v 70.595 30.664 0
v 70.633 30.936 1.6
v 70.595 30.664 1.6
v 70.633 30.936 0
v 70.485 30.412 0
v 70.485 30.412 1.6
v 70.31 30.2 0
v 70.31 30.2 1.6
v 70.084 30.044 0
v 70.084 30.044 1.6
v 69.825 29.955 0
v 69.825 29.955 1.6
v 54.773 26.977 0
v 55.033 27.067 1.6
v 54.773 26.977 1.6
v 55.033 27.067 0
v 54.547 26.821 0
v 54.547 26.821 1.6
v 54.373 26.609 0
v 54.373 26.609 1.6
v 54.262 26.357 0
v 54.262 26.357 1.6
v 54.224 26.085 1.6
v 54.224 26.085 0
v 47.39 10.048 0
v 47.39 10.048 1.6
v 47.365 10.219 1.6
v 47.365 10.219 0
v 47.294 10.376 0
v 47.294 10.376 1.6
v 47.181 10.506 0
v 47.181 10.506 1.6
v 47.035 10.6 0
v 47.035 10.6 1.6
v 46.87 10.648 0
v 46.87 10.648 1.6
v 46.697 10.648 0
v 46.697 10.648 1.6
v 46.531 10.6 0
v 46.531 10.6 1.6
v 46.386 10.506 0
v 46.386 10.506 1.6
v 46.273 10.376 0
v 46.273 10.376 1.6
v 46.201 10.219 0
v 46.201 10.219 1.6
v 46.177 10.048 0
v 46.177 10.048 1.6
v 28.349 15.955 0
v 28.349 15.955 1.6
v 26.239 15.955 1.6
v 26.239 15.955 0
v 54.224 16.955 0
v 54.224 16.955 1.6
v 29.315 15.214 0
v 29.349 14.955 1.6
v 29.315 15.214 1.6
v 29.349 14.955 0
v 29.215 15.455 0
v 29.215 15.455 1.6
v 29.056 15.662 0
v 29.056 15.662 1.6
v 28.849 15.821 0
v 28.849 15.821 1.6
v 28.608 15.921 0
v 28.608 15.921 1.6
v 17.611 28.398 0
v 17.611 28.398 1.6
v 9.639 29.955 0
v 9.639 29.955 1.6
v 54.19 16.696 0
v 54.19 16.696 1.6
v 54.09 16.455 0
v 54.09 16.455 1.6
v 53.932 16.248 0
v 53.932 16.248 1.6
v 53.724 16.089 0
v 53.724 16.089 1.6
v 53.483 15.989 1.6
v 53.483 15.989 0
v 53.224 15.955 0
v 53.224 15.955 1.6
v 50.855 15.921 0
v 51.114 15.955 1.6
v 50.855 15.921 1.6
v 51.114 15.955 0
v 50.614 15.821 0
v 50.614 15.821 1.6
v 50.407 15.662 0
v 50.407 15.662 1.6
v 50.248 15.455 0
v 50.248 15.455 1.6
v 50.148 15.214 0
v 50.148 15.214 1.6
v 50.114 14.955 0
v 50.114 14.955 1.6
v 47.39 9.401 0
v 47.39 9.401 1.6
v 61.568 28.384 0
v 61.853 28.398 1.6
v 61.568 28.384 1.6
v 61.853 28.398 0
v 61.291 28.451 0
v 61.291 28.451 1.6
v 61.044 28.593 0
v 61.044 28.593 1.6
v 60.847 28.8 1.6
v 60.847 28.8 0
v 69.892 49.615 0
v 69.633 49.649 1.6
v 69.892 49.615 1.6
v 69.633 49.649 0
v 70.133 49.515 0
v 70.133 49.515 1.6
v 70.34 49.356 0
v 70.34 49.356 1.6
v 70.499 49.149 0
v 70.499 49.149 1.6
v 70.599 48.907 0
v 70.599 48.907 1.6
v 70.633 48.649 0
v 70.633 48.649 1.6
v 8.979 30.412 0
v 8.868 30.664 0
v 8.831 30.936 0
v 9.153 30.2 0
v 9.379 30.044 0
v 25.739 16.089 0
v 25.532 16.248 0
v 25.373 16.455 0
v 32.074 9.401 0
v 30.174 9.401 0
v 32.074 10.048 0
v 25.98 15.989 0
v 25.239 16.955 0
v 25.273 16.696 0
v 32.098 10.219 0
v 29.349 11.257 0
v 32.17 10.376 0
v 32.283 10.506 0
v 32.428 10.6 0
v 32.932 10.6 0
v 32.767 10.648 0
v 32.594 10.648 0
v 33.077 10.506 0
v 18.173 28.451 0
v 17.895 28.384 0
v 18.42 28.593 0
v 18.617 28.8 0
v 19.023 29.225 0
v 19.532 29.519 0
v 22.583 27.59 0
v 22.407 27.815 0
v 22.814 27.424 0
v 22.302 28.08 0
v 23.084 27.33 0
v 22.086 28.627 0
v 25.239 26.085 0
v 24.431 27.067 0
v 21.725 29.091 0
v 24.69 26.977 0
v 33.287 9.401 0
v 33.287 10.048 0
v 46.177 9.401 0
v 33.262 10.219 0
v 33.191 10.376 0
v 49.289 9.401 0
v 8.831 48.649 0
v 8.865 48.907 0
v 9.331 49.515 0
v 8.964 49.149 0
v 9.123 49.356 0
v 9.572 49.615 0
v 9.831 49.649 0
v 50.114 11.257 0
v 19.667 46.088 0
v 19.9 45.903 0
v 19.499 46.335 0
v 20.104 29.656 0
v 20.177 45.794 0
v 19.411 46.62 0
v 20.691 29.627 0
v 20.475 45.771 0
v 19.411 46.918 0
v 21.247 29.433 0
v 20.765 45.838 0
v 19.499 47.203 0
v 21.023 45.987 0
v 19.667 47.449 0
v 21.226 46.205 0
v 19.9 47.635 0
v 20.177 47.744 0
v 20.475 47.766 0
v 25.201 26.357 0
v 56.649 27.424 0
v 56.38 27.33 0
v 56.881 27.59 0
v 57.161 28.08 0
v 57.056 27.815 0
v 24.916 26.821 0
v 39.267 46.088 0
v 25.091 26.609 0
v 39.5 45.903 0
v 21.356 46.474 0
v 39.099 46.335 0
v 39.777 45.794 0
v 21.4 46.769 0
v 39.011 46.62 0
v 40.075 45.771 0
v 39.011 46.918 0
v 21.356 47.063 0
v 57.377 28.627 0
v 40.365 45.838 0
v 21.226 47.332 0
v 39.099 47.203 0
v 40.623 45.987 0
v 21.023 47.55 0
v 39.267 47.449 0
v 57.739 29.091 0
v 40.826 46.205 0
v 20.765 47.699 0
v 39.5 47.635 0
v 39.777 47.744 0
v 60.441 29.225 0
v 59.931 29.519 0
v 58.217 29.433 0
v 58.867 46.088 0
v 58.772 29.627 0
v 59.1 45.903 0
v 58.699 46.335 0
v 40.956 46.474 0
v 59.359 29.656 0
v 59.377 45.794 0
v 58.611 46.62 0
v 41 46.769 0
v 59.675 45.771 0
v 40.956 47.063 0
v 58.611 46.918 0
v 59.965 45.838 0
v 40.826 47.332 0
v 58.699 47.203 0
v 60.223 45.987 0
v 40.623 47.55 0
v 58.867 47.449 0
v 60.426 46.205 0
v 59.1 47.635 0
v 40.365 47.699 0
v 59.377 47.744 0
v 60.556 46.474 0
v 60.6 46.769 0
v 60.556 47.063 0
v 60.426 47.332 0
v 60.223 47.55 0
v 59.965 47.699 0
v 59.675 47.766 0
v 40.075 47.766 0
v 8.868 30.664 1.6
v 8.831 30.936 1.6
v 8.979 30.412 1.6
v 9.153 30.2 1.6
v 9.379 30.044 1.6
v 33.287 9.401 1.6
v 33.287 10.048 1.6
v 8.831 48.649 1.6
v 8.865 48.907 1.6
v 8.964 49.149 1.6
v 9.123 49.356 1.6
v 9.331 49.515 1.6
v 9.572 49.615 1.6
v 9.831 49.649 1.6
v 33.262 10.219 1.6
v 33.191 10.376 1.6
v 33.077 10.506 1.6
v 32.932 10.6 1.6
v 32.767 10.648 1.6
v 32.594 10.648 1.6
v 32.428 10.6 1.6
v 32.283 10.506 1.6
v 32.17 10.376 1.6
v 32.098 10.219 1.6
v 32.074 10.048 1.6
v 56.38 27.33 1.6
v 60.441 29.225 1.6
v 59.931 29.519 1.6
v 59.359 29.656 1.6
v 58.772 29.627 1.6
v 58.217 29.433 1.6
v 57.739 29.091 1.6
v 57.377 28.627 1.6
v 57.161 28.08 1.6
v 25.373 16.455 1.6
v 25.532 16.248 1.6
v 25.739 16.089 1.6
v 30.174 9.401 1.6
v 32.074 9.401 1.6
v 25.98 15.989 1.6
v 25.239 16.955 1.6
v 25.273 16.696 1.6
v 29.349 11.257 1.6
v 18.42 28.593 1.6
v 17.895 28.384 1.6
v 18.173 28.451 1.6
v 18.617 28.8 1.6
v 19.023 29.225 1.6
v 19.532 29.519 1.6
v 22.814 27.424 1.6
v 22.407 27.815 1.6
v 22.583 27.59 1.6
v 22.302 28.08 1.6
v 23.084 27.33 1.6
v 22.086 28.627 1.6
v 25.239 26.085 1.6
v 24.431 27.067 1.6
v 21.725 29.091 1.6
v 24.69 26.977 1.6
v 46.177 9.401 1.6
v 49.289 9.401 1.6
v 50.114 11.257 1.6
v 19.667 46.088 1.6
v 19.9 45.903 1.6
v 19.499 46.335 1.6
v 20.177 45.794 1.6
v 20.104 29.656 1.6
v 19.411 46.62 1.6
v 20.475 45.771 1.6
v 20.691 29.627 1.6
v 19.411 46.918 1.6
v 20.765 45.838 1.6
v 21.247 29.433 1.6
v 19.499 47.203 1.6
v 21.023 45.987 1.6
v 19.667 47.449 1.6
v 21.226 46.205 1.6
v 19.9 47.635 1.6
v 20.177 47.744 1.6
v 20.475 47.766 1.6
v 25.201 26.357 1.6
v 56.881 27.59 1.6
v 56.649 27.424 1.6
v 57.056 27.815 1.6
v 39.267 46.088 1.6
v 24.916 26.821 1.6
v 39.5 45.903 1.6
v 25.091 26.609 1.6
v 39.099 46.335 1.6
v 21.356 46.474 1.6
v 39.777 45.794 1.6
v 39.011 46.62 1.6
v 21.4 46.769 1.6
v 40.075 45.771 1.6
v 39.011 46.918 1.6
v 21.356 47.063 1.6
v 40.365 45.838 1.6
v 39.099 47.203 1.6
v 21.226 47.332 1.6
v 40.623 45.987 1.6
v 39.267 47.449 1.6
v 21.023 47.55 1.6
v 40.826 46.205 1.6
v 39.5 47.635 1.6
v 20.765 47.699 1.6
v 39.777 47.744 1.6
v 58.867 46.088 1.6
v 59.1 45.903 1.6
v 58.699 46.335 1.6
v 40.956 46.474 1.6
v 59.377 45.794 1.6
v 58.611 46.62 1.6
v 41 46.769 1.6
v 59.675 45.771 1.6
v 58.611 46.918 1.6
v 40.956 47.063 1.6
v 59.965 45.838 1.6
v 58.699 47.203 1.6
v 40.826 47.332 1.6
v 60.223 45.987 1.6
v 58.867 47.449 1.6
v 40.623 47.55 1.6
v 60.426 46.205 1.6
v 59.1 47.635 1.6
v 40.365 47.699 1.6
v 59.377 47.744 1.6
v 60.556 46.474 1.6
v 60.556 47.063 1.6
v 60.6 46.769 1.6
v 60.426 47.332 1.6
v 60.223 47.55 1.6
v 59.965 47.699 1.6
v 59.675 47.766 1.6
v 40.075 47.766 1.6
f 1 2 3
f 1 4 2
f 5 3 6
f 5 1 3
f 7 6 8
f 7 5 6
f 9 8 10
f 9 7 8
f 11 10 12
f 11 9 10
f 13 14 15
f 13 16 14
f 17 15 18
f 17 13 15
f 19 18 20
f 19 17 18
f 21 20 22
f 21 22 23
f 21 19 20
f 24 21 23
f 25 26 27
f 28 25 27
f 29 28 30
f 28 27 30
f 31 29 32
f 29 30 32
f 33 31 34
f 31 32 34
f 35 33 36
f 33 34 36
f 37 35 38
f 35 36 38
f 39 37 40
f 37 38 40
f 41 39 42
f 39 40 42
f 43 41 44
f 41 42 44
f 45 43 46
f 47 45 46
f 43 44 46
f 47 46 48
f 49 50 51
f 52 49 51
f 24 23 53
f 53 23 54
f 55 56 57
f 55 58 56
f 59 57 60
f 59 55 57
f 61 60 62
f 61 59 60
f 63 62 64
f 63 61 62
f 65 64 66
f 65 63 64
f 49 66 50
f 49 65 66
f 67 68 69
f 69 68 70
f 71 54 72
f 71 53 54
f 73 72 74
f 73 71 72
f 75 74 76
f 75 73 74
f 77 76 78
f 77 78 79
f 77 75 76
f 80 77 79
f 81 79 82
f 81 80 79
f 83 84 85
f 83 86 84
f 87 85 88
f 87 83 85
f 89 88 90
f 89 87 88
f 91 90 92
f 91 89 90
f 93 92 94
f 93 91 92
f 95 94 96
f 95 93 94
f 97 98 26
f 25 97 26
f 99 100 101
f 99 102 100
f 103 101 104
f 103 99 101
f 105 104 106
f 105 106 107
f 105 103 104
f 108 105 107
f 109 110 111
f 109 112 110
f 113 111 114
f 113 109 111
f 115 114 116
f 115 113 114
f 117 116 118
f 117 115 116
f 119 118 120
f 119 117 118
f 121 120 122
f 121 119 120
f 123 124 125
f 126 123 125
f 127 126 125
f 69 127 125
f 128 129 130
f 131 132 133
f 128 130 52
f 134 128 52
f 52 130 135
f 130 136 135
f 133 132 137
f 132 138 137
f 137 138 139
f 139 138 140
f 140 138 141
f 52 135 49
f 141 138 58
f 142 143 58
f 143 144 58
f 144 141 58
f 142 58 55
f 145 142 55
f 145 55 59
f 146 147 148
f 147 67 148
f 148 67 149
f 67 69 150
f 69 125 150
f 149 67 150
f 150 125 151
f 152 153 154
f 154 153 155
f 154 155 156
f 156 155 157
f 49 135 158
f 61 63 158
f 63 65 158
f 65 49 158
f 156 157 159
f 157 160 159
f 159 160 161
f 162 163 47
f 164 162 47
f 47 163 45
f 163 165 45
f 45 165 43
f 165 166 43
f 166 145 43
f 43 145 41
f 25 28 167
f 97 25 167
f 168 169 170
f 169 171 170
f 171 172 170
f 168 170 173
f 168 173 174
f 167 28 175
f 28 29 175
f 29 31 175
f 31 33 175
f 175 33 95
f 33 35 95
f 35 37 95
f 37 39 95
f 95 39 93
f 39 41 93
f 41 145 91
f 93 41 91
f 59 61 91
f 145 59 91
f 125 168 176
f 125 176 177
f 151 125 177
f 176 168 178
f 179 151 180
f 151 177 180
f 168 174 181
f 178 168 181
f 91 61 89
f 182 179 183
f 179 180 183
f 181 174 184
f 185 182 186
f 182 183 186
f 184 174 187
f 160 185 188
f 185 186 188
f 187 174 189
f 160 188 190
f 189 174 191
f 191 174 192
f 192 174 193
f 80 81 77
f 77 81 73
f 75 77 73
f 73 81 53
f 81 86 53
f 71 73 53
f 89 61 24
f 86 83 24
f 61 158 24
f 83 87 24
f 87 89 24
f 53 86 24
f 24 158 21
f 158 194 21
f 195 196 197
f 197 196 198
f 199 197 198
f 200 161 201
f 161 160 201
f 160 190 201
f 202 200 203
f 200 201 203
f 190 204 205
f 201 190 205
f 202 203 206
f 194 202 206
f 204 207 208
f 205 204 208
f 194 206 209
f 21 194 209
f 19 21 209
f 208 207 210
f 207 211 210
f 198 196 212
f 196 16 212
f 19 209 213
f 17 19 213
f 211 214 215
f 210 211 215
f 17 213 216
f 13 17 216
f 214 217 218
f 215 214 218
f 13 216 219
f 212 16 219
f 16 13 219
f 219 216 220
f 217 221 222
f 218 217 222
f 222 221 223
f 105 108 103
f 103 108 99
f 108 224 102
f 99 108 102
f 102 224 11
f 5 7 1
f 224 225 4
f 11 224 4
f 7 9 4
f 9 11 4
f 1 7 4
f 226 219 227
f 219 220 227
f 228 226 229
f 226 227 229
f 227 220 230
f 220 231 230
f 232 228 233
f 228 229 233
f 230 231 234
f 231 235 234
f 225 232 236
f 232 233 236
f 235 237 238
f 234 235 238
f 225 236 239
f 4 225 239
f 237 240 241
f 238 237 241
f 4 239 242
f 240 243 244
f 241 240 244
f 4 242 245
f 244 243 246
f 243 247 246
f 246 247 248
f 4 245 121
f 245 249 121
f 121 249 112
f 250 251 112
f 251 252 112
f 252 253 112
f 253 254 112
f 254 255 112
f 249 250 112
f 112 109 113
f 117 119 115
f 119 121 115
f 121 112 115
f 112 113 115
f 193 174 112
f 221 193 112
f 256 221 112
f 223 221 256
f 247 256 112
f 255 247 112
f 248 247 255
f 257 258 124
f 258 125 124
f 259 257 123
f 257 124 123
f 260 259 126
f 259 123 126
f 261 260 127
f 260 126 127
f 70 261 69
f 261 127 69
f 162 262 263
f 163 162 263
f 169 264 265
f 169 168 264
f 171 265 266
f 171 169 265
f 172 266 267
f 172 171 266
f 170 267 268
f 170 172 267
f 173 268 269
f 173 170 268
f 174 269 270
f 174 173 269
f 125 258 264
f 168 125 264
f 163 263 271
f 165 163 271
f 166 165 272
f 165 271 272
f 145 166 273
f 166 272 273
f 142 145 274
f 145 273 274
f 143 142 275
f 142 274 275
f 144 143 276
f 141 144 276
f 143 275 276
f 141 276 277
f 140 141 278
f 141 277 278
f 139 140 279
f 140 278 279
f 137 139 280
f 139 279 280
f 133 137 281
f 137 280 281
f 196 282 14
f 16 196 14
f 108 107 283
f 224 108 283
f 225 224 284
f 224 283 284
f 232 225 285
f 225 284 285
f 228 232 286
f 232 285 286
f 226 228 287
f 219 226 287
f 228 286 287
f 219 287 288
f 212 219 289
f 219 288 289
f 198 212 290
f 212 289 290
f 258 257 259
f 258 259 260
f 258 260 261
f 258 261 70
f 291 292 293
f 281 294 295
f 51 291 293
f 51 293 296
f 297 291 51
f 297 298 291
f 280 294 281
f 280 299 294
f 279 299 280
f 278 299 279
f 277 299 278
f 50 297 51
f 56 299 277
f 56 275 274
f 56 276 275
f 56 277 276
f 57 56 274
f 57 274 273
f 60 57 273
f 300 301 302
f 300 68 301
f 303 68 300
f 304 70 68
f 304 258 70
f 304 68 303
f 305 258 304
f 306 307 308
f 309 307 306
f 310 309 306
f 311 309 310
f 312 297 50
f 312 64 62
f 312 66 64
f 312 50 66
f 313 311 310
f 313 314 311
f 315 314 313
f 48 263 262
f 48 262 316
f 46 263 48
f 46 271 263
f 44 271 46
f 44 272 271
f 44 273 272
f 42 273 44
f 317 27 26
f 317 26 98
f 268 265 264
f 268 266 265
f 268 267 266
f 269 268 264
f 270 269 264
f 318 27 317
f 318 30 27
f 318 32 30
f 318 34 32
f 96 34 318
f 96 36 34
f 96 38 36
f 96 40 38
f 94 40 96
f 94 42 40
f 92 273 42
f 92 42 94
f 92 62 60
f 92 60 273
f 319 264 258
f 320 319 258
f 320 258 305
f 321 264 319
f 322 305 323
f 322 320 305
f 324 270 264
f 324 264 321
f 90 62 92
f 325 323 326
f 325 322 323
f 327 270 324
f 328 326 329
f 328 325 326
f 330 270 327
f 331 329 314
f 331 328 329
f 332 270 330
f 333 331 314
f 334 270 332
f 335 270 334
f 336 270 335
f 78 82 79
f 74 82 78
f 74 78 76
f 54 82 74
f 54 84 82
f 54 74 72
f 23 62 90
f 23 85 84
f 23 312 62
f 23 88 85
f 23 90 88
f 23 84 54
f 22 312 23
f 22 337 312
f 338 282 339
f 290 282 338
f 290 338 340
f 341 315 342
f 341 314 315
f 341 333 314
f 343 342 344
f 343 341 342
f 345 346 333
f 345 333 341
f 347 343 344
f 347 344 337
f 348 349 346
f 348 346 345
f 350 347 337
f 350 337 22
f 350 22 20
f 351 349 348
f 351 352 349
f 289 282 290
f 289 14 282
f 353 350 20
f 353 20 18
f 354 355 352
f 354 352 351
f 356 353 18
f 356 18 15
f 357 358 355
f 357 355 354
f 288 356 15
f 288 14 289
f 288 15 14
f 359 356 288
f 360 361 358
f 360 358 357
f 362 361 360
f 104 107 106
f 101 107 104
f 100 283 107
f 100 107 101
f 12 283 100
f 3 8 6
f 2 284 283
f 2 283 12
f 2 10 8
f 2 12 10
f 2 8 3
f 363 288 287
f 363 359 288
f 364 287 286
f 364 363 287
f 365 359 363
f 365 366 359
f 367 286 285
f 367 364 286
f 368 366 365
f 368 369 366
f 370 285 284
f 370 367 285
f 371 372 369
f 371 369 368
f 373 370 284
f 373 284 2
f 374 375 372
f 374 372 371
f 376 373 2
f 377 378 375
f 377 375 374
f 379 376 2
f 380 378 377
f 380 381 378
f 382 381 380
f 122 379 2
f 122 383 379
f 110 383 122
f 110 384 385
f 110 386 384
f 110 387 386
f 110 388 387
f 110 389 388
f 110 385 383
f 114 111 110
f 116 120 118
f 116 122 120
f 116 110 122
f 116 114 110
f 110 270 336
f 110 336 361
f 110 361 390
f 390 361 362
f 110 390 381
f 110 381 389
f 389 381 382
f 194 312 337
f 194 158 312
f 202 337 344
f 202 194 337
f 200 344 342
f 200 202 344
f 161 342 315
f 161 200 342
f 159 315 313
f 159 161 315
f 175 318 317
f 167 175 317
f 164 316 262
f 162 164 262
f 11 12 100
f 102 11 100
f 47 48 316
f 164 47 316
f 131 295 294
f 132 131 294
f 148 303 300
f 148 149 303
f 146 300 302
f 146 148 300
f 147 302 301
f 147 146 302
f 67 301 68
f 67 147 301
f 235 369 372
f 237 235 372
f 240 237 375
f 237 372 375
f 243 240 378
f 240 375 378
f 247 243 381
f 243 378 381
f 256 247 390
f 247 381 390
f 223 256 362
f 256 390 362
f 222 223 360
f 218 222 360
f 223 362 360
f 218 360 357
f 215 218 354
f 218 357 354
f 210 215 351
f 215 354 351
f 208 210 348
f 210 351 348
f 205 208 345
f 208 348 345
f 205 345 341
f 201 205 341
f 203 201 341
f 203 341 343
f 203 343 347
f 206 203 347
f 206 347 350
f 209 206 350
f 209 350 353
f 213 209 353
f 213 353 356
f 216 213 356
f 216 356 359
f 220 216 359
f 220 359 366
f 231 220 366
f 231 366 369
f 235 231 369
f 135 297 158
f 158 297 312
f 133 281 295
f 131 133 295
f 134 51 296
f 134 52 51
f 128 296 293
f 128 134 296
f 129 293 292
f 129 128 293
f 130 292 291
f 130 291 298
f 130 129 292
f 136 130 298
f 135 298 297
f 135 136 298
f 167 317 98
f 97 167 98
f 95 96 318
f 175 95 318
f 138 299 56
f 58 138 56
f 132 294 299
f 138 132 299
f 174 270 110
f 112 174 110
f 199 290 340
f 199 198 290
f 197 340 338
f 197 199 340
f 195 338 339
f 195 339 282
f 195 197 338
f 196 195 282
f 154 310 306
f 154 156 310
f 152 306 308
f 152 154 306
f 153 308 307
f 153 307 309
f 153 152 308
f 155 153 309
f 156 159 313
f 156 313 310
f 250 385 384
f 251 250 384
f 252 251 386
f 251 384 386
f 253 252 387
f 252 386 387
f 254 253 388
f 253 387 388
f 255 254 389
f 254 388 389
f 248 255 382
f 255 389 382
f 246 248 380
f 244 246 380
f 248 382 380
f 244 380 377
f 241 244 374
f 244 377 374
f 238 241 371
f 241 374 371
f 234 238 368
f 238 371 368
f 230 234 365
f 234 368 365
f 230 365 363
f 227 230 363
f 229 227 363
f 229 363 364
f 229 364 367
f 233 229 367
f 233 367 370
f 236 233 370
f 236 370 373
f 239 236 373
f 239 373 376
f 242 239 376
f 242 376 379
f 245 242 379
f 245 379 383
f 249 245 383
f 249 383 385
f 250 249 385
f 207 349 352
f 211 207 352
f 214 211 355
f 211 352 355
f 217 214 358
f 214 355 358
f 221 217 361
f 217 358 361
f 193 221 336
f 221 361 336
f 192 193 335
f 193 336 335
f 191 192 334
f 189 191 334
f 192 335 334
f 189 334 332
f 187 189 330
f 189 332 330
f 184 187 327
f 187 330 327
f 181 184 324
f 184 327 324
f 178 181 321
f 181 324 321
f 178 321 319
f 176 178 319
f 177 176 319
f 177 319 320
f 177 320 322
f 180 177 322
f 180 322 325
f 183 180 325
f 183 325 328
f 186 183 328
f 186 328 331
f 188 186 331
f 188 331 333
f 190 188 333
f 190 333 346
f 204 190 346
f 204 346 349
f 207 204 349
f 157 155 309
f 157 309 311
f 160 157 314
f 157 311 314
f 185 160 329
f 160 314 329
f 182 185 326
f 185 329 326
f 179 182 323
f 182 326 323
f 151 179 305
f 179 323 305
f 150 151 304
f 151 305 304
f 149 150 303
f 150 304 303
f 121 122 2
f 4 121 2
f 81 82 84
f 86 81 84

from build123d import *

# Parameters (mm, degrees)
SKETCH1_W           = 80
SKETCH1_H           = 60
BOSS_EXTRUDE1_DEPTH = 1.6
SKETCH2_OUTSIDE_W   = 102.002
SKETCH2_OUTSIDE_H   = 82.002
CUT_EXTRUDE1_DEPTH  = 1.6
FILLET1_R           = 1
SKETCH3_R           = 1
CUT_EXTRUDE2_DEPTH  = 10


with BuildPart() as part:
    # Sketch1 → Boss-Extrude1 (new body)
    with BuildSketch(Plane.XY):
        with Locations((40, 30)):
            Rectangle(SKETCH1_W, SKETCH1_H)
    extrude(amount=BOSS_EXTRUDE1_DEPTH)

    # Sketch2 outside → Cut-Extrude1 (cut)
    with BuildSketch(Plane.XY.offset(1.6)):
        with Locations((40, 30)):
            Rectangle(SKETCH2_OUTSIDE_W, SKETCH2_OUTSIDE_H)
        with BuildLine():
            Line((8.830524125, 49.648617791), (70.632878184, 49.648617791))
            Line((70.632878184, 49.648617791), (70.632878184, 30.112540158))
            Line((70.632878184, 30.112540158), (61.123106489, 28.255784683))
            ThreePointArc((61.123106489, 28.255784683), (58.77201565, 29.627241667), (57.109476194, 27.472134952))
            Line((57.109476194, 27.472134952), (54.224418996, 26.908835862))
            Line((54.224418996, 26.908835862), (54.224418996, 15.955223451))
            Line((54.224418996, 15.955223451), (50.114060899, 15.955223451))
            Line((50.114060899, 15.955223451), (50.114060899, 11.256501231))
            Line((50.114060899, 11.256501231), (49.289397665, 9.401008955))
            Line((49.289397665, 9.401008955), (47.389901446, 9.401008955))
            Line((47.389901446, 9.401008955), (47.389901446, 10.047799846))
            ThreePointArc((47.389901446, 10.047799846), (46.783221619, 10.654479673), (46.176541793, 10.047799846))
            Line((46.176541793, 10.047799846), (46.176541793, 9.401008955))
            Line((46.176541793, 9.401008955), (33.286860516, 9.401008955))
            Line((33.286860516, 9.401008955), (33.286860516, 10.047799846))
            ThreePointArc((33.286860516, 10.047799846), (32.68018069, 10.654479673), (32.073500863, 10.047799846))
            Line((32.073500863, 10.047799846), (32.073500863, 9.401008955))
            Line((32.073500863, 9.401008955), (30.174004644, 9.401008955))
            Line((30.174004644, 9.401008955), (29.34934141, 11.256501231))
            Line((29.34934141, 11.256501231), (29.34934141, 15.955223451))
            Line((29.34934141, 15.955223451), (25.238983313, 15.955223451))
            Line((25.238983313, 15.955223451), (25.238983313, 26.908835862))
            Line((25.238983313, 26.908835862), (22.353926115, 27.472134952))
            ThreePointArc((22.353926115, 27.472134952), (20.691386659, 29.627241667), (18.34029582, 28.255784683))
            Line((18.34029582, 28.255784683), (8.830524125, 30.112540158))
            Line((8.830524125, 30.112540158), (8.830524125, 49.648617791))
        make_face(mode=Mode.SUBTRACT)
    extrude(amount=-CUT_EXTRUDE1_DEPTH, mode=Mode.SUBTRACT)

    # Fillet1
    fillet1_edges = [part.edges().sort_by_distance(p)[0] for p in [
        (8.830524125, 49.648617791, 0.8),
        (70.632878184, 49.648617791, 0.8),
        (70.632878184, 30.112540158, 0.8),
        (61.123106489, 28.255784683, 0.8),
        (57.109476194, 27.472134952, 0.8),
        (54.224418996, 26.908835862, 0.8),
        (54.224418996, 15.955223451, 0.8),
        (50.114060899, 15.955223451, 0.8),
        (29.34934141, 15.955223451, 0.8),
        (25.238983313, 15.955223451, 0.8),
        (25.238983313, 26.908835862, 0.8),
        (22.353926115, 27.472134952, 0.8),
        (18.34029582, 28.255784683, 0.8),
        (8.830524125, 30.112540158, 0.8),
    ]]
    fillet(fillet1_edges, radius=FILLET1_R)

    # Sketch3 → Cut-Extrude2 (cut)
    with BuildSketch(Plane.XY.offset(1.6)):
        with Locations((20.4, 46.768617791)):
            Circle(SKETCH3_R)
        with Locations((40, 46.768617791)):
            Circle(SKETCH3_R)
        with Locations((59.6, 46.768617791)):
            Circle(SKETCH3_R)
    extrude(amount=-CUT_EXTRUDE2_DEPTH, mode=Mode.SUBTRACT)


solid = part.part
